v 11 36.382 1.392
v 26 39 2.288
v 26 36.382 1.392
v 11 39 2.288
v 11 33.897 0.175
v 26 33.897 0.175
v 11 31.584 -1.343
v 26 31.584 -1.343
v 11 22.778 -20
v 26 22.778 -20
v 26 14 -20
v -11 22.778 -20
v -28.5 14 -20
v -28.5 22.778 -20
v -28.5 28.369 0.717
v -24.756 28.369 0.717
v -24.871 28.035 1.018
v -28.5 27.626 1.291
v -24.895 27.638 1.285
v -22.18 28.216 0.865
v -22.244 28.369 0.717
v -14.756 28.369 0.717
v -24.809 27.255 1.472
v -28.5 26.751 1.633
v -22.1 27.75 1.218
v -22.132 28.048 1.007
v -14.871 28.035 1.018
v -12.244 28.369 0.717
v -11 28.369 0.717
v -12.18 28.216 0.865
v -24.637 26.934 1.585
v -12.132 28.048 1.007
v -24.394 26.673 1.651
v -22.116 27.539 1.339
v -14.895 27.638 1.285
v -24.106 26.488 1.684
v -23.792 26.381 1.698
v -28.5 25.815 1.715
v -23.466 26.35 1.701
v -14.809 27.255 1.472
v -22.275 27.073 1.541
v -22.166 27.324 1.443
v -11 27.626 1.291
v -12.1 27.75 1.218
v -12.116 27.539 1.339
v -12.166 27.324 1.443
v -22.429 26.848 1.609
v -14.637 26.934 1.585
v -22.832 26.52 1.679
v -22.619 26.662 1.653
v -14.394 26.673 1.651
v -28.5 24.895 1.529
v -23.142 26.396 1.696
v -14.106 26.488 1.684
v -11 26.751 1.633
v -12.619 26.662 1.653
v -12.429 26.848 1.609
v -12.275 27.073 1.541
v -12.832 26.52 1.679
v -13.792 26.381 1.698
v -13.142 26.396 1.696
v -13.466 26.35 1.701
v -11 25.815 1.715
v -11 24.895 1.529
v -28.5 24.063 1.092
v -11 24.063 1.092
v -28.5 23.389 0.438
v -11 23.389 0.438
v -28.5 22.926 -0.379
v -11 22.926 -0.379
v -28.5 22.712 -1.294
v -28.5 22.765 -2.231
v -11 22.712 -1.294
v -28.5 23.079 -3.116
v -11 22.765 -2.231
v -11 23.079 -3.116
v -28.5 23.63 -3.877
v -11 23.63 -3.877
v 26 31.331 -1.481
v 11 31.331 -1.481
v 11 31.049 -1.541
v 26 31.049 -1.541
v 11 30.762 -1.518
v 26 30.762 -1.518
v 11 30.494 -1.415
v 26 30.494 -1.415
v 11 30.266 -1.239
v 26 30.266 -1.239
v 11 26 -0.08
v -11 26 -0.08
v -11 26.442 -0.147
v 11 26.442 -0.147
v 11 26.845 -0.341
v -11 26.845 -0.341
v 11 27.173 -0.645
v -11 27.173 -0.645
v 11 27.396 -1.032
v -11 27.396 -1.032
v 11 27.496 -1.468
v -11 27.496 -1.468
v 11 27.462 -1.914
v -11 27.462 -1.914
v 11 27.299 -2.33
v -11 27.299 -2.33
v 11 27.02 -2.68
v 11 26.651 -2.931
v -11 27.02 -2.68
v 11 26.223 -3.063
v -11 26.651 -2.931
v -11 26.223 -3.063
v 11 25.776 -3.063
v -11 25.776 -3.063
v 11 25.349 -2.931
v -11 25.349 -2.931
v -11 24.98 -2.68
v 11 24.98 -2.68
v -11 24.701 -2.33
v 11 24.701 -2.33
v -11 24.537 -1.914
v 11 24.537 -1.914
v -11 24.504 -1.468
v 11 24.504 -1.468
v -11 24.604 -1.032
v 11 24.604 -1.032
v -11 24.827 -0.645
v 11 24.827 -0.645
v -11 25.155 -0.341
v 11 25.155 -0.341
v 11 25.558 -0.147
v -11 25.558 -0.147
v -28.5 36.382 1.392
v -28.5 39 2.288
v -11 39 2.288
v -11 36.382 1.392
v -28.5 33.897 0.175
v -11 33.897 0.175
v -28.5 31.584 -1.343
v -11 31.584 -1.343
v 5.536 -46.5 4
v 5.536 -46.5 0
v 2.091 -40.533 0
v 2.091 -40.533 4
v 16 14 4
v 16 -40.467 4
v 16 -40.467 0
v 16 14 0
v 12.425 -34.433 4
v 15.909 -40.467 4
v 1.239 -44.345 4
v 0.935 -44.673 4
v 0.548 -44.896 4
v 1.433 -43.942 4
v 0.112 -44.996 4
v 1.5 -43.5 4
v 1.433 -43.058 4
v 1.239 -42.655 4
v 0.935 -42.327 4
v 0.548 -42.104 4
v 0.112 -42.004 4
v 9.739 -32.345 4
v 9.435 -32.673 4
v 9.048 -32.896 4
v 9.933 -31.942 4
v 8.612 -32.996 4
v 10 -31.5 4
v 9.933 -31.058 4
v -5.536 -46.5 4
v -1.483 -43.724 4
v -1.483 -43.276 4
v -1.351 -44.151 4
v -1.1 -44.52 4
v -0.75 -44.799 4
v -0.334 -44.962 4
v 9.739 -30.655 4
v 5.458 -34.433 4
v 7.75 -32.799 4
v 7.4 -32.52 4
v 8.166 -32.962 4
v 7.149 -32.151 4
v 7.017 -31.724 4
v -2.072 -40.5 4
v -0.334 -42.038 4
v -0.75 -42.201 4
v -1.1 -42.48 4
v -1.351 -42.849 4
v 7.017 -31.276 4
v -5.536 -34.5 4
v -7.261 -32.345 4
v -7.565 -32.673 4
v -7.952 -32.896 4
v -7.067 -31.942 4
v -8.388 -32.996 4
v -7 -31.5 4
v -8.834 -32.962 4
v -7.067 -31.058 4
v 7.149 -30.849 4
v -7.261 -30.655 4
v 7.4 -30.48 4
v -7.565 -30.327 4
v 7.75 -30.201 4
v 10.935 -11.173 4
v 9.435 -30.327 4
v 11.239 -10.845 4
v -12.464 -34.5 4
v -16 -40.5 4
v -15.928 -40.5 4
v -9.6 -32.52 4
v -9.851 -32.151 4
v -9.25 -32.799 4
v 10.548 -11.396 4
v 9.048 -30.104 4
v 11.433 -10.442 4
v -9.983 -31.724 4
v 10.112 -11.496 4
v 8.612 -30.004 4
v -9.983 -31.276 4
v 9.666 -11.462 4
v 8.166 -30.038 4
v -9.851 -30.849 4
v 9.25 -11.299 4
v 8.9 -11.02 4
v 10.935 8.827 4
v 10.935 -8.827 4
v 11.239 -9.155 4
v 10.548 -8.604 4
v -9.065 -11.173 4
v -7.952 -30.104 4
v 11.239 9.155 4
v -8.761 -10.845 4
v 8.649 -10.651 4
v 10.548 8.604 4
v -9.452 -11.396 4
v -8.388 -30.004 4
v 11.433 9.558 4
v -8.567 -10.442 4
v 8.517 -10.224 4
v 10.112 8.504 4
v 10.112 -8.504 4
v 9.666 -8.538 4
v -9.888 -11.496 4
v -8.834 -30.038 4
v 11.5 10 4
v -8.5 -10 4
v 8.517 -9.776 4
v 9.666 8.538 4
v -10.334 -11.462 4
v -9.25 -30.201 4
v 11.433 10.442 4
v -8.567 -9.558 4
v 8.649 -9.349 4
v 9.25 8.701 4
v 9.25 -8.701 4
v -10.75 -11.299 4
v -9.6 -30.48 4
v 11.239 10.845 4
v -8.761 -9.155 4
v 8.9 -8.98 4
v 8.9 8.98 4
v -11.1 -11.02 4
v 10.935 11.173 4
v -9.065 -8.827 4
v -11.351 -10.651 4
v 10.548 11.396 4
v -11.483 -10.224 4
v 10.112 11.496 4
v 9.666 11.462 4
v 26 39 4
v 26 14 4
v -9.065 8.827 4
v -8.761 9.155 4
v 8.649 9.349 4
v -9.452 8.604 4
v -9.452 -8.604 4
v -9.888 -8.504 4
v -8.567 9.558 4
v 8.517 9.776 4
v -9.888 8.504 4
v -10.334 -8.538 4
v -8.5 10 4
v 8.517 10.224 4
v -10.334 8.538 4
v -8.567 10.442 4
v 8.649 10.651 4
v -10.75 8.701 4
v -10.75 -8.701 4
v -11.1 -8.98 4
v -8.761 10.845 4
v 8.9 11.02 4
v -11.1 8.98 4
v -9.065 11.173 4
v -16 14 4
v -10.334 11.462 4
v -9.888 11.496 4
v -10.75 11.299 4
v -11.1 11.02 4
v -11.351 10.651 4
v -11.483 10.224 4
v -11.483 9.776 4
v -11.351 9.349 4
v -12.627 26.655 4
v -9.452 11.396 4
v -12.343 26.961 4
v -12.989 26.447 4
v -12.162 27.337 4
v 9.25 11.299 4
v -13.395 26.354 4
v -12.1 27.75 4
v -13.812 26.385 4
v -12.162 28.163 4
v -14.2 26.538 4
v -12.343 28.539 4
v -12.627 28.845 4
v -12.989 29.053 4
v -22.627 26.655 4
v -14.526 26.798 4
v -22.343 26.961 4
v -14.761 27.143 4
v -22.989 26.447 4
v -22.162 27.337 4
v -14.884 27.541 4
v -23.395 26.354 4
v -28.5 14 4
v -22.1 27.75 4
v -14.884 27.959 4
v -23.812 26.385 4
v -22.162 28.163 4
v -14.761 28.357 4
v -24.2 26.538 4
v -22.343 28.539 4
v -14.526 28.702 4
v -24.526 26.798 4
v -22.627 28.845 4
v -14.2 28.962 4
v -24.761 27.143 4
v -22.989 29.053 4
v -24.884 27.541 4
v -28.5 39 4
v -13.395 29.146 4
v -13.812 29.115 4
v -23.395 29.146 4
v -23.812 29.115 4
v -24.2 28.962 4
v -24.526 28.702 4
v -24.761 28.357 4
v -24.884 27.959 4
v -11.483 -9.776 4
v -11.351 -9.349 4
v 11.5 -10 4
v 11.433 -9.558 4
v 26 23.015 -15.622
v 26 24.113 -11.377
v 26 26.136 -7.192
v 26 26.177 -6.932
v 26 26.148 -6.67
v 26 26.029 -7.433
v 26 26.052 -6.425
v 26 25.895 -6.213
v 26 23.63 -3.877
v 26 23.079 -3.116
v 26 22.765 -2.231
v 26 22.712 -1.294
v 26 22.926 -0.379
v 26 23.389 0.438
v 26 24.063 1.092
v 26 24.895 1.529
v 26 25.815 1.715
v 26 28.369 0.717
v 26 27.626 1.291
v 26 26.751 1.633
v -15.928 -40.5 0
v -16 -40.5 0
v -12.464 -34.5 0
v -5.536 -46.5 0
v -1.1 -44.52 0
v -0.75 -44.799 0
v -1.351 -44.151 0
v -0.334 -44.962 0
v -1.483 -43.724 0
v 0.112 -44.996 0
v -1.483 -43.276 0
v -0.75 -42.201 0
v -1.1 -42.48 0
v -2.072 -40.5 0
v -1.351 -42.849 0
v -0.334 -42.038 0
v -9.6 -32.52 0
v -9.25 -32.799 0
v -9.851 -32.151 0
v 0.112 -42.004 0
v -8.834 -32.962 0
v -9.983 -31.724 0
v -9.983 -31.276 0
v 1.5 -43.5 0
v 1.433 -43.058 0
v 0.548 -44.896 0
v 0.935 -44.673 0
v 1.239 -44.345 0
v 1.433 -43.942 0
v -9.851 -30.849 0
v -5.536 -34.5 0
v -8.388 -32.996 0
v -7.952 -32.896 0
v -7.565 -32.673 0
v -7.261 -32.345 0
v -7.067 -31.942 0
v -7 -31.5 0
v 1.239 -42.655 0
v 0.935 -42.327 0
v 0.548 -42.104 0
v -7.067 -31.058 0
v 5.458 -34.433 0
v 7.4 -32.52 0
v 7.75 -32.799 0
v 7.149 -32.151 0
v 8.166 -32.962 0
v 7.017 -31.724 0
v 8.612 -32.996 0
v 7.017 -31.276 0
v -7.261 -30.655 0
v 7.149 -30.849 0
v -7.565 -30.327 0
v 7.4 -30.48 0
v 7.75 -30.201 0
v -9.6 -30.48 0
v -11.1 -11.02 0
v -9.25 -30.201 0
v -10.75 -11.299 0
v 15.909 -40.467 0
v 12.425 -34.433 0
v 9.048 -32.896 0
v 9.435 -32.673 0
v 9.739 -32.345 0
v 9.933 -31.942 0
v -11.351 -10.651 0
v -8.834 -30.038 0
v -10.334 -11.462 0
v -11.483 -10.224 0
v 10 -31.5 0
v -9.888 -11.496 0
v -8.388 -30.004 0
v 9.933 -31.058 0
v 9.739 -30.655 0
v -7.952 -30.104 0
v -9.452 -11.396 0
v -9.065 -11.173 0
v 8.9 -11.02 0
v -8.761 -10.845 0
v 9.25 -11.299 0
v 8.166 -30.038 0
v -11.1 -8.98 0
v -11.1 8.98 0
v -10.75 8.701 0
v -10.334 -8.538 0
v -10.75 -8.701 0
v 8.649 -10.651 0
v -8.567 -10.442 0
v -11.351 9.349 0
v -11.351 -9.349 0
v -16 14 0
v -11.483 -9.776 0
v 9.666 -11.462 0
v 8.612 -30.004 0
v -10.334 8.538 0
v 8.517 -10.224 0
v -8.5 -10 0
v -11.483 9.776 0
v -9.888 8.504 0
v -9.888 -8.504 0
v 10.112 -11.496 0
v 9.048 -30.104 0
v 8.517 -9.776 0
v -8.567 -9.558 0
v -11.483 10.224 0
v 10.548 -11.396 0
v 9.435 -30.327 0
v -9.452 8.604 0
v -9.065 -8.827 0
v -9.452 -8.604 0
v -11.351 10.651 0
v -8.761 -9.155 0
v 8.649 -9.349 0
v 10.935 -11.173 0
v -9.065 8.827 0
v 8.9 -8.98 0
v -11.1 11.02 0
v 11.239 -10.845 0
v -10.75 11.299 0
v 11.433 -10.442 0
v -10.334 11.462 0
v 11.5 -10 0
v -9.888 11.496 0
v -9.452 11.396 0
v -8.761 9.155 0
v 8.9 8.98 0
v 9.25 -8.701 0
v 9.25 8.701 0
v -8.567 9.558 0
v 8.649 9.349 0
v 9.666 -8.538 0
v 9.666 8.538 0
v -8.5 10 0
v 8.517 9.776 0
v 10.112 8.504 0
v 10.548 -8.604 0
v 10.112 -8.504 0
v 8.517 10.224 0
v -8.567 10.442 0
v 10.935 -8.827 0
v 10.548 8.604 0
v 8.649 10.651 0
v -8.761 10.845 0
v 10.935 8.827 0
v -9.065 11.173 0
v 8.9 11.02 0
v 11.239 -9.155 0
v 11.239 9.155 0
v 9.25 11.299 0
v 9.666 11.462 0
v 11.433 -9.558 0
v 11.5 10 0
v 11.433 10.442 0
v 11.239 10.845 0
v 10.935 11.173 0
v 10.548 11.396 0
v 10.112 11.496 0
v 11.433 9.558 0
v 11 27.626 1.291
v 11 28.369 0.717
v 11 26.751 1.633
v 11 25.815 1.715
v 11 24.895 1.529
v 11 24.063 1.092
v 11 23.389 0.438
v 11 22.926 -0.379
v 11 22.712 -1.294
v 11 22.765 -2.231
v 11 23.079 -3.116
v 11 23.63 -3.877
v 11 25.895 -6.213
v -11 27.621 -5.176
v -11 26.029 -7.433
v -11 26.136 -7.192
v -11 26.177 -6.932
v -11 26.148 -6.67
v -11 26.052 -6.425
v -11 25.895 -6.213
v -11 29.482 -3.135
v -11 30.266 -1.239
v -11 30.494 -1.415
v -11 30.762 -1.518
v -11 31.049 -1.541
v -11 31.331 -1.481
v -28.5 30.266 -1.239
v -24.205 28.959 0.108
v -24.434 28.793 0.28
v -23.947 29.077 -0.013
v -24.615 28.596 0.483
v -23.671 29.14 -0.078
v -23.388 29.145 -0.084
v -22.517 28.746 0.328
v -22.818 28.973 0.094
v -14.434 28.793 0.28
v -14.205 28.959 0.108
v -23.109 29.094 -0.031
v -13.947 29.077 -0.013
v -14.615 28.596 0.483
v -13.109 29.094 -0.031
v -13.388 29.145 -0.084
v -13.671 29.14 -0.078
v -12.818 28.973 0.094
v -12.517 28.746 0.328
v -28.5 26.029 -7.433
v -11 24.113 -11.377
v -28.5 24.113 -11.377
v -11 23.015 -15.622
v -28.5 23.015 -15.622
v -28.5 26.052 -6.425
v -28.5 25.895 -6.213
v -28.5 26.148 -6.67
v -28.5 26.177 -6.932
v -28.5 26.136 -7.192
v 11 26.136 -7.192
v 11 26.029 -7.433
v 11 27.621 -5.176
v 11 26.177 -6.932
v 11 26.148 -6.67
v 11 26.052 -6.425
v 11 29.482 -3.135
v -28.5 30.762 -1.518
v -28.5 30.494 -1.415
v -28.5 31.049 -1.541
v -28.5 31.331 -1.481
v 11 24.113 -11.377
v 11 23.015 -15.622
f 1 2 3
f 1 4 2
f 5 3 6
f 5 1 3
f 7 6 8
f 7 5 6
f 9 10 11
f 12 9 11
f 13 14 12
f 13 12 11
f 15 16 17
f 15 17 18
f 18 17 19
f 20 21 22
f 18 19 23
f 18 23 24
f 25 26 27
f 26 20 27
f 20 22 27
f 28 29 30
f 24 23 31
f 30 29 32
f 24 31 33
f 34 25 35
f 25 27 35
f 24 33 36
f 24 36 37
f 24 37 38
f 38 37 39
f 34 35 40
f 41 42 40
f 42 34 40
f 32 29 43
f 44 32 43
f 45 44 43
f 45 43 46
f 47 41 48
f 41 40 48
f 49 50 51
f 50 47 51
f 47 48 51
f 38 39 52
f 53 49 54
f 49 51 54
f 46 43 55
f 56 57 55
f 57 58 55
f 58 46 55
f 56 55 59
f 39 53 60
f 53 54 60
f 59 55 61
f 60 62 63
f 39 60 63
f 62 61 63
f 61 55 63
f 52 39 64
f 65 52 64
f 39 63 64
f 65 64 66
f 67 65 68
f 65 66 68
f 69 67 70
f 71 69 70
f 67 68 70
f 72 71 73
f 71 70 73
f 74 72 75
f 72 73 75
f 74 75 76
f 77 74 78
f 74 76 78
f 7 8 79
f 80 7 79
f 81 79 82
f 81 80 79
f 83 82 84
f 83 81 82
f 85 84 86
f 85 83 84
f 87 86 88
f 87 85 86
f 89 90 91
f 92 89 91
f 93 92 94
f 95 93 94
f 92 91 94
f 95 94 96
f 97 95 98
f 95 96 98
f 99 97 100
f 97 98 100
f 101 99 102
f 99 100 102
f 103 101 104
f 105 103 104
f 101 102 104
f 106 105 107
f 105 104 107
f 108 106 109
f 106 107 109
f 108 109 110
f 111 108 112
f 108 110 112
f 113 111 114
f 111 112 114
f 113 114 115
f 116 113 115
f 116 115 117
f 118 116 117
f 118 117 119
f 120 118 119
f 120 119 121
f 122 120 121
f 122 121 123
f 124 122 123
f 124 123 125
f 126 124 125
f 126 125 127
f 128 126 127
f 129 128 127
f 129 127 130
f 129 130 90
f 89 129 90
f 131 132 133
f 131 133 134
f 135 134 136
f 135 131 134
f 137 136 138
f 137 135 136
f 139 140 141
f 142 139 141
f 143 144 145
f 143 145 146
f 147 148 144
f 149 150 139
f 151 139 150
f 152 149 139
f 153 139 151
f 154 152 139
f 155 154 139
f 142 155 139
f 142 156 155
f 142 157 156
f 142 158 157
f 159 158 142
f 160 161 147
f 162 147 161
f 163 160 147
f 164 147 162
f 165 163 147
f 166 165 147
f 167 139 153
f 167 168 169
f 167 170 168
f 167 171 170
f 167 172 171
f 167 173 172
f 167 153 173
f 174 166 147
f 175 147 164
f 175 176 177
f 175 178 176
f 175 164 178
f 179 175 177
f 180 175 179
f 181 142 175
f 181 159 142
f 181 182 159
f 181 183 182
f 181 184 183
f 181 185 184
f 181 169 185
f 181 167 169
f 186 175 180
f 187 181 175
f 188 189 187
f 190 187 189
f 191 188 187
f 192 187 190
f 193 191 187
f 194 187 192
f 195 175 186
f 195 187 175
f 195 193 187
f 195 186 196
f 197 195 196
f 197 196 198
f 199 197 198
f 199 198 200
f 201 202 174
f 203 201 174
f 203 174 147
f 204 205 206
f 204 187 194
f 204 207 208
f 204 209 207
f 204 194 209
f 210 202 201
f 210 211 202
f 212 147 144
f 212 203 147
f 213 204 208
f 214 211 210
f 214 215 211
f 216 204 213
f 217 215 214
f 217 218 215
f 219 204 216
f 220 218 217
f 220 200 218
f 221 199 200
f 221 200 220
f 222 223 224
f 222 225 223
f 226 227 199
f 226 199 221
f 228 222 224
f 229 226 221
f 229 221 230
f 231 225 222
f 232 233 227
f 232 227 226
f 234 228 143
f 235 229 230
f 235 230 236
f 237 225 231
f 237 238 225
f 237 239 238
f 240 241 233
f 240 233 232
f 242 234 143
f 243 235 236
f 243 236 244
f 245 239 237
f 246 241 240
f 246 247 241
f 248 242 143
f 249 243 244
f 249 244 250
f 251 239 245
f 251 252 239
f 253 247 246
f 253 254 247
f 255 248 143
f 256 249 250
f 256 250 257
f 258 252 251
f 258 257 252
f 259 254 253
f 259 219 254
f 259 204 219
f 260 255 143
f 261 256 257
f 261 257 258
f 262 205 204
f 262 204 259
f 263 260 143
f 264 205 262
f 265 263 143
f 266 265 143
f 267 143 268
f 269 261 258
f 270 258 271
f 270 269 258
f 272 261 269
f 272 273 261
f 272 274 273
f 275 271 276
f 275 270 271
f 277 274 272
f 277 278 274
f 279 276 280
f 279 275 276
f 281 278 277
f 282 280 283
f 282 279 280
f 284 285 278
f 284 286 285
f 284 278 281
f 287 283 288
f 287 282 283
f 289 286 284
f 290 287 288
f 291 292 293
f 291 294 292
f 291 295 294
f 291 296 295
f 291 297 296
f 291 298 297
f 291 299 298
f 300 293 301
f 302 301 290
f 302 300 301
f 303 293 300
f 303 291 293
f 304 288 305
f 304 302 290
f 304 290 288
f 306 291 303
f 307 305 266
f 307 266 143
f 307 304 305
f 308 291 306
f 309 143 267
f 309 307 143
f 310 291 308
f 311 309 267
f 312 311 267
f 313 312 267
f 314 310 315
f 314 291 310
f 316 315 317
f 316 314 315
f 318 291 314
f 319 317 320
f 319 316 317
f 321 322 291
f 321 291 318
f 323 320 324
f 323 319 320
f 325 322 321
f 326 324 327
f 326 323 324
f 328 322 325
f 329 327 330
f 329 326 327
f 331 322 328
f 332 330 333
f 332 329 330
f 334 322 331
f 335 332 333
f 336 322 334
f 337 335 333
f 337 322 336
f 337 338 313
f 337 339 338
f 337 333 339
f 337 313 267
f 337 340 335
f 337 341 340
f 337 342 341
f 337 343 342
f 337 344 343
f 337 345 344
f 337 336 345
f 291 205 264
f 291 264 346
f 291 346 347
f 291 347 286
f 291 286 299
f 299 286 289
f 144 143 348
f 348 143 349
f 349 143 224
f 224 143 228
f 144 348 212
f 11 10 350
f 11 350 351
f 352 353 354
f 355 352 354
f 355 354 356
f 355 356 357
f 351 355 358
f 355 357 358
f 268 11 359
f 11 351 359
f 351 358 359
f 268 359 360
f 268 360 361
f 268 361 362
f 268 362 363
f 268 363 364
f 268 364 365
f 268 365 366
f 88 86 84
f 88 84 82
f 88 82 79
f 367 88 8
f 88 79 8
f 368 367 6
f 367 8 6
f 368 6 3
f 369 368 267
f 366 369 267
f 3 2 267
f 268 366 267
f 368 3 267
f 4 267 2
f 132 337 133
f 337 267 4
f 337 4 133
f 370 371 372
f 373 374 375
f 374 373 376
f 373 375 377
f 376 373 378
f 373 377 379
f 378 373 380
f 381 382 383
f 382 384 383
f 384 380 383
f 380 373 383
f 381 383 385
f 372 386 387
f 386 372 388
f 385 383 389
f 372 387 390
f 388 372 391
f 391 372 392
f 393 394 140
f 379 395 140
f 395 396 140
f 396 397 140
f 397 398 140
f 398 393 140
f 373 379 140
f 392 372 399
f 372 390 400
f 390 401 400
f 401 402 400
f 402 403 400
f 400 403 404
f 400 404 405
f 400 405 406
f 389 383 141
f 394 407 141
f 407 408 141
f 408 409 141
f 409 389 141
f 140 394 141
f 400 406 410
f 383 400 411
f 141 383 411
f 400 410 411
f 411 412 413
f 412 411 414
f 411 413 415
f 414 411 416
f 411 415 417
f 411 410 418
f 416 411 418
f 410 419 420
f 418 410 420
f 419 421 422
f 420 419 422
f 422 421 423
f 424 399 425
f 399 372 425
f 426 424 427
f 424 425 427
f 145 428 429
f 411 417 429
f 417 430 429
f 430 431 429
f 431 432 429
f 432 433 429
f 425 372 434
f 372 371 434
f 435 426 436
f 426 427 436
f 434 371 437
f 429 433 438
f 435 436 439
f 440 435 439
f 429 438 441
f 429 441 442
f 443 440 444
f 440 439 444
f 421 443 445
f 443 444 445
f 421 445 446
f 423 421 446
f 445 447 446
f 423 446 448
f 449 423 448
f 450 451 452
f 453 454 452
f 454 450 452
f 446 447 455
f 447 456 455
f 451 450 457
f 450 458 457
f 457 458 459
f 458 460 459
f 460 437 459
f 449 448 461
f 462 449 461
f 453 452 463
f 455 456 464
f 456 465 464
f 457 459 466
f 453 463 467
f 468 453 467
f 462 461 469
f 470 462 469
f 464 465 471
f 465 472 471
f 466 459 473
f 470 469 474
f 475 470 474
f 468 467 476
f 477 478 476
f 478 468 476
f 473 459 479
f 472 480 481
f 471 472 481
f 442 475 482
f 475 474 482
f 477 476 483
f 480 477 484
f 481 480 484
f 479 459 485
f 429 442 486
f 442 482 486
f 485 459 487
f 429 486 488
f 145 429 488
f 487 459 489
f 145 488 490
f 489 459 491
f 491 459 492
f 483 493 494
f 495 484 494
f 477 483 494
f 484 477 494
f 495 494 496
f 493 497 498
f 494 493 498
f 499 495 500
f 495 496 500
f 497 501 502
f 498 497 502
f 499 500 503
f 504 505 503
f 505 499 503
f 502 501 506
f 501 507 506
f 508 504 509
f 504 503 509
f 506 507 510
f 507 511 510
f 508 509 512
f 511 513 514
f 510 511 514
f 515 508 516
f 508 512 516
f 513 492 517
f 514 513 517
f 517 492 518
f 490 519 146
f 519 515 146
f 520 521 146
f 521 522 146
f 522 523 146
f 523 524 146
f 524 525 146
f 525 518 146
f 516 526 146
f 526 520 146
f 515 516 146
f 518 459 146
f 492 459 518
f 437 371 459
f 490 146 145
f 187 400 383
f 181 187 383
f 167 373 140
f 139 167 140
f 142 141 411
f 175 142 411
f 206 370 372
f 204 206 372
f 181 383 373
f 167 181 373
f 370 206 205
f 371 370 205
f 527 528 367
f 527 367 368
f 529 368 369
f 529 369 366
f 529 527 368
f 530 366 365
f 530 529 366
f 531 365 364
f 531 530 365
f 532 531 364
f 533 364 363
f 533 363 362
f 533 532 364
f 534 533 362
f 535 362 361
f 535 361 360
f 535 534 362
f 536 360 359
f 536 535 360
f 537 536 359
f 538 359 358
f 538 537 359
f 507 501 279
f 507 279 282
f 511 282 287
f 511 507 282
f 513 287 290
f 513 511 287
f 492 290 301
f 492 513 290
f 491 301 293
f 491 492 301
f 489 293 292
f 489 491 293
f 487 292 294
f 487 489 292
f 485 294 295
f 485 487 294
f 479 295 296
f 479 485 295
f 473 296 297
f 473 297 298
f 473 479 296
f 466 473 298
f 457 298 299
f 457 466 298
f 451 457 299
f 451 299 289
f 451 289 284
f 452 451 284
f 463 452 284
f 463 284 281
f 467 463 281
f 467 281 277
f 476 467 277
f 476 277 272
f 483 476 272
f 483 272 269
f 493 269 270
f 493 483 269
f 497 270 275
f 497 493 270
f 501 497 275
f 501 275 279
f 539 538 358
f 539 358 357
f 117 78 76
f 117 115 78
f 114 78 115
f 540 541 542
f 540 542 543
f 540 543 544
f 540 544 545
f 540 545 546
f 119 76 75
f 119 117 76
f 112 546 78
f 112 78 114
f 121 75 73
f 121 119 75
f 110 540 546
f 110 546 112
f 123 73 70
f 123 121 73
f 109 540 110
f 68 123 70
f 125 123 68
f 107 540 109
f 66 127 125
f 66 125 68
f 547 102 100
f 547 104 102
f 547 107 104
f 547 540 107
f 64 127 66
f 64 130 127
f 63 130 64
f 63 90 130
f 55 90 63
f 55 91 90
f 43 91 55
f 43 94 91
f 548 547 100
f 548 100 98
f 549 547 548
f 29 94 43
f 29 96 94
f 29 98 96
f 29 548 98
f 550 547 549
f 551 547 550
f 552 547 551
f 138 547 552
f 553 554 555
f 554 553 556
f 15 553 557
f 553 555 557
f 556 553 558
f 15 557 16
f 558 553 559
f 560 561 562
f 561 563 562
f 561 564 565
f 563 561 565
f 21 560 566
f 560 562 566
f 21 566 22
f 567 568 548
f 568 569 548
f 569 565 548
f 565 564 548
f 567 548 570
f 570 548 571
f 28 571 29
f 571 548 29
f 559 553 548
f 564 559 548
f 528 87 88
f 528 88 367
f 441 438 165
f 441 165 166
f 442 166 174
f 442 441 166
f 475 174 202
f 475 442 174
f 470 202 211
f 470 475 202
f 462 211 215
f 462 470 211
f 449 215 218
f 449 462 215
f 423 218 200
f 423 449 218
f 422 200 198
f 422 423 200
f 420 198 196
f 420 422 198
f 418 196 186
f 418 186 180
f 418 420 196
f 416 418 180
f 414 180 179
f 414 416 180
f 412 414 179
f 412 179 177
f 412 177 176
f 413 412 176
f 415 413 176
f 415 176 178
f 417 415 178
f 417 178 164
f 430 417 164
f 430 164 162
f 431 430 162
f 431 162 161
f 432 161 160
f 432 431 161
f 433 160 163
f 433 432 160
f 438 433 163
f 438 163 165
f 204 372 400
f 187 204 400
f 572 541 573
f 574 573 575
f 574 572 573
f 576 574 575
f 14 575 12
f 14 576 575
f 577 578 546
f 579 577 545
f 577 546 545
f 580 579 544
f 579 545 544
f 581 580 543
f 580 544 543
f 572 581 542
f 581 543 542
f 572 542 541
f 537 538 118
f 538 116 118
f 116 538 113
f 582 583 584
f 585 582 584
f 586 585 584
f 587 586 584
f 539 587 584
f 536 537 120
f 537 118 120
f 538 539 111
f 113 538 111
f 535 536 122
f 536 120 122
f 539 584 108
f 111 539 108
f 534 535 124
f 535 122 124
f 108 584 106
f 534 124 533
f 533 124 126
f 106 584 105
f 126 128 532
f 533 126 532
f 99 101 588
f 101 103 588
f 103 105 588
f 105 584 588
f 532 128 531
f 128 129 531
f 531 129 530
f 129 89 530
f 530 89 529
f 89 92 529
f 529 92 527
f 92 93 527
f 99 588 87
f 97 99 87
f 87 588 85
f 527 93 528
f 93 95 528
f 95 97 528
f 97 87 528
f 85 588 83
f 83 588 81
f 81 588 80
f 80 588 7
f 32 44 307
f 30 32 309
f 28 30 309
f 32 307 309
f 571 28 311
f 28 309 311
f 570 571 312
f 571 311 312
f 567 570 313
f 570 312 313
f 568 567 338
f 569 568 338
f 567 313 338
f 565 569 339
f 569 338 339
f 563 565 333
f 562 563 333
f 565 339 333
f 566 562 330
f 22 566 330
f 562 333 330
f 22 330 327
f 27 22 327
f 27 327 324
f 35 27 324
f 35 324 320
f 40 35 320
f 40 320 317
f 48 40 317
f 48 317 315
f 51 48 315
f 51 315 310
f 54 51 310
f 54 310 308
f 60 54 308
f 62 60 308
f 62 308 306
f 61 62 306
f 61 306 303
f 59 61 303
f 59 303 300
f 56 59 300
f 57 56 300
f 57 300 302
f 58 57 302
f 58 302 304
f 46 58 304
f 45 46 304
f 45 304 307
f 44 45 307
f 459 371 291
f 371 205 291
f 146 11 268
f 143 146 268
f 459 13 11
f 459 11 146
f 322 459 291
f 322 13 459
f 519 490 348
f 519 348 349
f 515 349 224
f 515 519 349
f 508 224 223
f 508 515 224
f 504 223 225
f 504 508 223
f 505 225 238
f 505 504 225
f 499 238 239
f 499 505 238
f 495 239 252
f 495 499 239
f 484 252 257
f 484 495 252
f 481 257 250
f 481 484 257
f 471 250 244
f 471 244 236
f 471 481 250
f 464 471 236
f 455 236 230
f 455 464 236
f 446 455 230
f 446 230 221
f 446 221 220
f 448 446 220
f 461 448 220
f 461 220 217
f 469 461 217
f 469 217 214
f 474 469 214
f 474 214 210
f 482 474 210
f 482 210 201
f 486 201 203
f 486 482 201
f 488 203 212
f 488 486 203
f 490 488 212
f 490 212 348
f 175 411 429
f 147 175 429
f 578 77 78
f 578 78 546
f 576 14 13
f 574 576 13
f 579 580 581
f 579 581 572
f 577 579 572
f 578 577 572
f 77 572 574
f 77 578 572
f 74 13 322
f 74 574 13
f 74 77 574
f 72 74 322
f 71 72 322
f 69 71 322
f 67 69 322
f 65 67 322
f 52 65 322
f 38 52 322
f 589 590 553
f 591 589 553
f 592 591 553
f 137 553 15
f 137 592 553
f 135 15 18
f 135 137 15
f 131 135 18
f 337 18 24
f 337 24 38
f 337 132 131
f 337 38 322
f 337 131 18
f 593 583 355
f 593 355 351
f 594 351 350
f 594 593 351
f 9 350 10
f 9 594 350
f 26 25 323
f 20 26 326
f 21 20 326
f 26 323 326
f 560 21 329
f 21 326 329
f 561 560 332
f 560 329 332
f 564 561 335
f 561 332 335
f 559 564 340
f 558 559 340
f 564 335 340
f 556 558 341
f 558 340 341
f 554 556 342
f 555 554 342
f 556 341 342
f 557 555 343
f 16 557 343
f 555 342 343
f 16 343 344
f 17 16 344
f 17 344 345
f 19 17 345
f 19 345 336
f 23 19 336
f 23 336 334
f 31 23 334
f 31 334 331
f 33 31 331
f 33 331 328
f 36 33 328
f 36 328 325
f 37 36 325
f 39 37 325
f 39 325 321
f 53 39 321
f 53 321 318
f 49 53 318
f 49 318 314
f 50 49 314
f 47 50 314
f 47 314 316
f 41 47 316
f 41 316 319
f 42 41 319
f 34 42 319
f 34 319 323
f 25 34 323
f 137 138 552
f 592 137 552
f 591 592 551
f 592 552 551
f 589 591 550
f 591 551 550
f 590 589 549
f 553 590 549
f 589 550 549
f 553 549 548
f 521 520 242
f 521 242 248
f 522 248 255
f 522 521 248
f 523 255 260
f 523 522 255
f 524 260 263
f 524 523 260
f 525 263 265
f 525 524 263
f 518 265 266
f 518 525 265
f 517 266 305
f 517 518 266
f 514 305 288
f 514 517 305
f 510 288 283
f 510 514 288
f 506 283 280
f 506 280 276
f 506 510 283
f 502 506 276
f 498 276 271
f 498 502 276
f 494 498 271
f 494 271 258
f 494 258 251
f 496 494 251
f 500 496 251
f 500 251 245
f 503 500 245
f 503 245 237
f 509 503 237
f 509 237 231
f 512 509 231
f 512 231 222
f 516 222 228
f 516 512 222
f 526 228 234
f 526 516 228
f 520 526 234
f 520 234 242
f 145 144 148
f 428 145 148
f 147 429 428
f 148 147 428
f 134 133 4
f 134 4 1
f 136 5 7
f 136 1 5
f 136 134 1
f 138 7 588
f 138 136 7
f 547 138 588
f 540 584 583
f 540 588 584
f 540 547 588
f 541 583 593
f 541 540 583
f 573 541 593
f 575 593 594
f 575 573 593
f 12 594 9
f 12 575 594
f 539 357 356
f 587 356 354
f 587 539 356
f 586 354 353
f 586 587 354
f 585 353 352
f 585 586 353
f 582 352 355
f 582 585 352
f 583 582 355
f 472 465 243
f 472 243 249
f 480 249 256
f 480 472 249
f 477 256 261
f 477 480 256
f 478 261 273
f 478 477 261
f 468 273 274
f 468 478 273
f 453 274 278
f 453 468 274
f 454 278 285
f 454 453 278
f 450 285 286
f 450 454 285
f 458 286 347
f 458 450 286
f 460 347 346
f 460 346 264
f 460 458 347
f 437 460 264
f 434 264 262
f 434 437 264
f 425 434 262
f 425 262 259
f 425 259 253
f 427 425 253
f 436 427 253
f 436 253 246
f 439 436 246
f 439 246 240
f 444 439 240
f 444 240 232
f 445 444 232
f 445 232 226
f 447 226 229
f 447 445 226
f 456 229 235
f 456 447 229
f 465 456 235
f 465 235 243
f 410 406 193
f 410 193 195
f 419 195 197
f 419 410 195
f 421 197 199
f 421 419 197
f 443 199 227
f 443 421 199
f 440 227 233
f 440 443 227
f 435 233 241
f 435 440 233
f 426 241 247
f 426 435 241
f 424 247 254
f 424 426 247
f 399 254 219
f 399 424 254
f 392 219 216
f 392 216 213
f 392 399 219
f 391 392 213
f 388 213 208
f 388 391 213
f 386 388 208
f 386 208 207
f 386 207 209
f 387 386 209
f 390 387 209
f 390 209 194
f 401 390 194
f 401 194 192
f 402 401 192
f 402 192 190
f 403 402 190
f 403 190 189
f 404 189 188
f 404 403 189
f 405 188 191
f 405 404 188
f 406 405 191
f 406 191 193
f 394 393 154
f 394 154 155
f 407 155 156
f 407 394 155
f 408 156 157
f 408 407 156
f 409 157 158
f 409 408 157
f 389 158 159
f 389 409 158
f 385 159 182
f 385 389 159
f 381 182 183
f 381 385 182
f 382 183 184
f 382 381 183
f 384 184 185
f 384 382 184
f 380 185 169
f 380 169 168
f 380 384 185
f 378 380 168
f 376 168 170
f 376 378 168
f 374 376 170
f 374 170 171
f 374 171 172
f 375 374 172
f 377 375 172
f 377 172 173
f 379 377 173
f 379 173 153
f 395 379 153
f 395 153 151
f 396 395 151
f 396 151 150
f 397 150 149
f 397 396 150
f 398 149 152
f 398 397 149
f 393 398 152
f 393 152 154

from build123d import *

# Parameters (mm, degrees)
SKETCH1_R               = 1.500000001
SKETCH1_R_2             = 1.5
BOSS_EXTRUDE2_DEPTH     = 4
SKETCH1_4_W             = 32
SKETCH1_4_H             = 25
SKETCH1_4_R             = 6.100000001
BOSS_EXTRUDE3_DEPTH     = 20
SKETCH2_R               = 1.5
CUT_EXTRUDE3_DEPTH      = 1
CUT_EXTRUDE3_DEPTH_BACK = 33
CUT_EXTRUDE4_DEPTH      = 5
CUT_EXTRUDE5_START      = -32
CUT_EXTRUDE5_DEPTH      = 5
CUT_EXTRUDE6_DEPTH      = 25
BOSS_EXTRUDE5_DEPTH     = 12.5
CUT_EXTRUDE7_REACH      = 26
SKETCH7_R               = 1.4
BOSS_EXTRUDE6_START     = -32
BOSS_EXTRUDE6_DEPTH     = 10
CUT_EXTRUDE8_DEPTH      = 43


with BuildPart() as part:
    # Sketch1 → Boss-Extrude2 (new body)
    with BuildSketch(Plane.XY):
        Polygon((-16, 39), (-16, -46.5), (-14.969293645, -46.5), (-14.969293645, -42.160880121), (-15.92820323, -40.5), (-12.464101615, -34.5), (-5.535898385, -34.5), (-2.07179677, -40.5), (-5.535898385, -46.5), (5.535898385, -46.5), (2.090853862, -40.533007852), (5.457729166, -34.432863746), (12.425340481, -34.432863746), (15.909146138, -40.466992148), (15, -42.114193768), (15, -46.5), (16, -46.5), (16, 39), align=None)
        with Locations((10, 10)):
            Circle(SKETCH1_R, mode=Mode.SUBTRACT)
        with Locations((-10, -10)):
            Circle(SKETCH1_R, mode=Mode.SUBTRACT)
        with Locations((10, -10)):
            Circle(SKETCH1_R, mode=Mode.SUBTRACT)
        with Locations((-10, 10)):
            Circle(SKETCH1_R, mode=Mode.SUBTRACT)
        with Locations((0, -43.5)):
            Circle(SKETCH1_R_2, mode=Mode.SUBTRACT)
        with Locations((-8.5, -31.5)):
            Circle(SKETCH1_R_2, mode=Mode.SUBTRACT)
        with Locations((8.5, -31.5)):
            Circle(SKETCH1_R_2, mode=Mode.SUBTRACT)
    extrude(amount=BOSS_EXTRUDE2_DEPTH)

    # Sketch1<4> → Boss-Extrude3 (add)
    with BuildSketch(Plane.XY):
        with Locations((0, 26.5)):
            Rectangle(SKETCH1_4_W, SKETCH1_4_H)
        Polygon((0, 36.969655115), (9.5, 31.484827557), (9.5, 20.515172443), (0, 15.030344885), (-9.5, 20.515172443), (-9.5, 31.484827557), align=None, mode=Mode.SUBTRACT)
        Polygon((9.5, 31.484827557), (9.5, 20.515172443), (0, 15.030344885), (-9.5, 20.515172443), (-9.5, 31.484827557), (0, 36.969655115), align=None)
        with Locations((0, 26)):
            Circle(SKETCH1_4_R, mode=Mode.SUBTRACT)
        with Locations((0, 26)):
            Circle(SKETCH1_4_R)
    extrude(amount=-BOSS_EXTRUDE3_DEPTH)

    # Sketch2 → Cut-Extrude3 (cut, two sides)
    with BuildSketch(Plane.ZY.offset(16)) as cut_extrude3_sk:
        with Locations((-1.580023732, 25.999827557)):
            Circle(SKETCH2_R)
    extrude(amount=CUT_EXTRUDE3_DEPTH, mode=Mode.SUBTRACT)
    extrude(cut_extrude3_sk.sketch, amount=-CUT_EXTRUDE3_DEPTH_BACK, mode=Mode.SUBTRACT)

    # Sketch3 → Cut-Extrude4 (cut)
    with BuildSketch(Plane.ZY.offset(16)):
        with BuildLine():
            Line((0.716979622, 28.369168308), (-1.239134605, 30.265561192))
            ThreePointArc((-1.239134605, 30.265561192), (-1.539975782, 30.904899692), (-1.343104133, 31.583501701))
            ThreePointArc((-1.343104133, 31.583501701), (0.822230527, 35.120419324), (2.287602236, 39))
            Line((2.287602236, 39), (-20, 39))
            Line((-20, 39), (-20, 22.778106647))
            ThreePointArc((-20, 22.778106647), (-13.472070231, 23.458477945), (-7.432949471, 26.028651597))
            ThreePointArc((-7.432949471, 26.028651597), (-6.799957072, 26.171029415), (-6.212814046, 25.894960789))
            Line((-6.212814046, 25.894960789), (-3.877027086, 23.630486807))
            Line((-3.877027086, 23.630486807), (0.716979622, 28.369168308))
        make_face()
        with BuildLine():
            ThreePointArc((-3.877027086, 23.630486807), (0.789317018, 23.702824203), (0.716979622, 28.369168308))
            Line((0.716979622, 28.369168308), (-3.877027086, 23.630486807))
        make_face()
    extrude(amount=-CUT_EXTRUDE4_DEPTH, mode=Mode.SUBTRACT)

    # Sketch3<4> → Cut-Extrude5 (cut)
    with BuildSketch(Plane.ZY.offset(16).offset(CUT_EXTRUDE5_START)):
        with BuildLine():
            Line((0.716979622, 28.369168308), (-1.239134605, 30.265561192))
            ThreePointArc((-1.239134605, 30.265561192), (-1.539975782, 30.904899692), (-1.343104133, 31.583501701))
            ThreePointArc((-1.343104133, 31.583501701), (0.822230527, 35.120419324), (2.287602236, 39))
            Line((2.287602236, 39), (-20, 39))
            Line((-20, 39), (-20, 22.778106647))
            ThreePointArc((-20, 22.778106647), (-13.472070231, 23.458477945), (-7.432949471, 26.028651597))
            ThreePointArc((-7.432949471, 26.028651597), (-6.799957072, 26.171029415), (-6.212814046, 25.894960789))
            Line((-6.212814046, 25.894960789), (-3.877027086, 23.630486807))
            Line((-3.877027086, 23.630486807), (0.716979622, 28.369168308))
        make_face()
        with BuildLine():
            ThreePointArc((-3.877027086, 23.630486807), (0.789317018, 23.702824203), (0.716979622, 28.369168308))
            Line((0.716979622, 28.369168308), (-3.877027086, 23.630486807))
        make_face()
    extrude(amount=CUT_EXTRUDE5_DEPTH, mode=Mode.SUBTRACT)

    # Sketch5 → Cut-Extrude6 (cut, through all)
    with BuildSketch(Plane.XY.offset(4)):
        Polygon((-14.969293645, -42.160880121), (-15.92820323, -40.5), (-16, -40.500074436), (-16, -46.5), (-14.969293645, -46.5), align=None)
        Polygon((15, -42.114193768), (15.909146138, -40.466992148), (10.36687247, -40.472738184), (10.36687247, -46.5), (15, -46.5), align=None)
        Polygon((16, -40.466897954), (15.909146138, -40.466992148), (15, -42.114193768), (15, -46.5), (16, -46.5), align=None)
        Polygon((17.825288522, -40.465005559), (16, -40.466897954), (16, -46.5), (17.916172301, -46.5), align=None)
    extrude(amount=-CUT_EXTRUDE6_DEPTH, mode=Mode.SUBTRACT)

    # Sketch8 → Boss-Extrude5 (add)
    with BuildSketch(Plane.ZY.offset(16)):
        with BuildLine():
            ThreePointArc((-1.343104133, 31.583501701), (-1.539975782, 30.904899692), (-1.239134605, 30.265561192))
            Line((-1.239134605, 30.265561192), (0.716979622, 28.369168308))
            ThreePointArc((0.716979622, 28.369168308), (0.789317018, 23.702824203), (-3.877027086, 23.630486807))
            Line((-3.877027086, 23.630486807), (-6.212814046, 25.894960789))
            ThreePointArc((-6.212814046, 25.894960789), (-6.799957072, 26.171029415), (-7.432949471, 26.028651597))
            ThreePointArc((-7.432949471, 26.028651597), (-13.472070231, 23.458477945), (-20, 22.778106647))
            Line((-20, 22.778106647), (-20, 14))
            Line((-20, 14), (0, 14))
            Line((0, 14), (4, 14))
            Line((4, 14), (4, 39))
            Line((4, 39), (2.287602236, 39))
            ThreePointArc((2.287602236, 39), (0.822230527, 35.120419324), (-1.343104133, 31.583501701))
        make_face()
    extrude(amount=BOSS_EXTRUDE5_DEPTH)

    # Sketch7 → Cut-Extrude7 (cut, up to next)
    with BuildSketch(Plane.XY.offset(4), mode=Mode.PRIVATE) as cut_extrude7_sk1:
        with Locations((-23.5, 27.75)):
            Circle(SKETCH7_R)
    cut_extrude7_tool1 = extrude(cut_extrude7_sk1.sketch, amount=-CUT_EXTRUDE7_REACH, mode=Mode.PRIVATE) & part.part
    add(cut_extrude7_tool1.solids().sort_by_distance((-23.5, 27.75, 4))[0], mode=Mode.SUBTRACT)
    # Sketch7 → Cut-Extrude7 (cut, up to next)
    with BuildSketch(Plane.XY.offset(4), mode=Mode.PRIVATE) as cut_extrude7_sk2:
        with Locations((-13.5, 27.75)):
            Circle(SKETCH7_R)
    cut_extrude7_tool2 = extrude(cut_extrude7_sk2.sketch, amount=-CUT_EXTRUDE7_REACH, mode=Mode.PRIVATE) & part.part
    add(cut_extrude7_tool2.solids().sort_by_distance((-13.5, 27.75, 4))[0], mode=Mode.SUBTRACT)

    # Sketch8<3> → Boss-Extrude6 (add)
    with BuildSketch(Plane.ZY.offset(16).offset(BOSS_EXTRUDE6_START)):
        with BuildLine():
            ThreePointArc((-1.343104133, 31.583501701), (-1.539975782, 30.904899692), (-1.239134605, 30.265561192))
            Line((-1.239134605, 30.265561192), (0.716979622, 28.369168308))
            ThreePointArc((0.716979622, 28.369168308), (0.789317018, 23.702824203), (-3.877027086, 23.630486807))
            Line((-3.877027086, 23.630486807), (-6.212814046, 25.894960789))
            ThreePointArc((-6.212814046, 25.894960789), (-6.799957072, 26.171029415), (-7.432949471, 26.028651597))
            ThreePointArc((-7.432949471, 26.028651597), (-13.472070231, 23.458477945), (-20, 22.778106647))
            Line((-20, 22.778106647), (-20, 14))
            Line((-20, 14), (0, 14))
            Line((0, 14), (4, 14))
            Line((4, 14), (4, 39))
            Line((4, 39), (2.287602236, 39))
            ThreePointArc((2.287602236, 39), (0.822230527, 35.120419324), (-1.343104133, 31.583501701))
        make_face()
    extrude(amount=-BOSS_EXTRUDE6_DEPTH)

    # Sketch8<4> → Cut-Extrude8 (cut, through all)
    with BuildSketch(Plane.ZY.offset(16)):
        with BuildLine():
            ThreePointArc((-1.343104133, 31.583501701), (-4.126373378, 28.519223025), (-7.432949471, 26.028651597))
            ThreePointArc((-7.432949471, 26.028651597), (-13.472070231, 23.458477945), (-20, 22.778106647))
            Line((-20, 22.778106647), (-20, 39))
            Line((-20, 39), (2.287602236, 39))
            ThreePointArc((2.287602236, 39), (0.822230527, 35.120419324), (-1.343104133, 31.583501701))
        make_face()
    extrude(amount=-CUT_EXTRUDE8_DEPTH, mode=Mode.SUBTRACT)


solid = part.part
